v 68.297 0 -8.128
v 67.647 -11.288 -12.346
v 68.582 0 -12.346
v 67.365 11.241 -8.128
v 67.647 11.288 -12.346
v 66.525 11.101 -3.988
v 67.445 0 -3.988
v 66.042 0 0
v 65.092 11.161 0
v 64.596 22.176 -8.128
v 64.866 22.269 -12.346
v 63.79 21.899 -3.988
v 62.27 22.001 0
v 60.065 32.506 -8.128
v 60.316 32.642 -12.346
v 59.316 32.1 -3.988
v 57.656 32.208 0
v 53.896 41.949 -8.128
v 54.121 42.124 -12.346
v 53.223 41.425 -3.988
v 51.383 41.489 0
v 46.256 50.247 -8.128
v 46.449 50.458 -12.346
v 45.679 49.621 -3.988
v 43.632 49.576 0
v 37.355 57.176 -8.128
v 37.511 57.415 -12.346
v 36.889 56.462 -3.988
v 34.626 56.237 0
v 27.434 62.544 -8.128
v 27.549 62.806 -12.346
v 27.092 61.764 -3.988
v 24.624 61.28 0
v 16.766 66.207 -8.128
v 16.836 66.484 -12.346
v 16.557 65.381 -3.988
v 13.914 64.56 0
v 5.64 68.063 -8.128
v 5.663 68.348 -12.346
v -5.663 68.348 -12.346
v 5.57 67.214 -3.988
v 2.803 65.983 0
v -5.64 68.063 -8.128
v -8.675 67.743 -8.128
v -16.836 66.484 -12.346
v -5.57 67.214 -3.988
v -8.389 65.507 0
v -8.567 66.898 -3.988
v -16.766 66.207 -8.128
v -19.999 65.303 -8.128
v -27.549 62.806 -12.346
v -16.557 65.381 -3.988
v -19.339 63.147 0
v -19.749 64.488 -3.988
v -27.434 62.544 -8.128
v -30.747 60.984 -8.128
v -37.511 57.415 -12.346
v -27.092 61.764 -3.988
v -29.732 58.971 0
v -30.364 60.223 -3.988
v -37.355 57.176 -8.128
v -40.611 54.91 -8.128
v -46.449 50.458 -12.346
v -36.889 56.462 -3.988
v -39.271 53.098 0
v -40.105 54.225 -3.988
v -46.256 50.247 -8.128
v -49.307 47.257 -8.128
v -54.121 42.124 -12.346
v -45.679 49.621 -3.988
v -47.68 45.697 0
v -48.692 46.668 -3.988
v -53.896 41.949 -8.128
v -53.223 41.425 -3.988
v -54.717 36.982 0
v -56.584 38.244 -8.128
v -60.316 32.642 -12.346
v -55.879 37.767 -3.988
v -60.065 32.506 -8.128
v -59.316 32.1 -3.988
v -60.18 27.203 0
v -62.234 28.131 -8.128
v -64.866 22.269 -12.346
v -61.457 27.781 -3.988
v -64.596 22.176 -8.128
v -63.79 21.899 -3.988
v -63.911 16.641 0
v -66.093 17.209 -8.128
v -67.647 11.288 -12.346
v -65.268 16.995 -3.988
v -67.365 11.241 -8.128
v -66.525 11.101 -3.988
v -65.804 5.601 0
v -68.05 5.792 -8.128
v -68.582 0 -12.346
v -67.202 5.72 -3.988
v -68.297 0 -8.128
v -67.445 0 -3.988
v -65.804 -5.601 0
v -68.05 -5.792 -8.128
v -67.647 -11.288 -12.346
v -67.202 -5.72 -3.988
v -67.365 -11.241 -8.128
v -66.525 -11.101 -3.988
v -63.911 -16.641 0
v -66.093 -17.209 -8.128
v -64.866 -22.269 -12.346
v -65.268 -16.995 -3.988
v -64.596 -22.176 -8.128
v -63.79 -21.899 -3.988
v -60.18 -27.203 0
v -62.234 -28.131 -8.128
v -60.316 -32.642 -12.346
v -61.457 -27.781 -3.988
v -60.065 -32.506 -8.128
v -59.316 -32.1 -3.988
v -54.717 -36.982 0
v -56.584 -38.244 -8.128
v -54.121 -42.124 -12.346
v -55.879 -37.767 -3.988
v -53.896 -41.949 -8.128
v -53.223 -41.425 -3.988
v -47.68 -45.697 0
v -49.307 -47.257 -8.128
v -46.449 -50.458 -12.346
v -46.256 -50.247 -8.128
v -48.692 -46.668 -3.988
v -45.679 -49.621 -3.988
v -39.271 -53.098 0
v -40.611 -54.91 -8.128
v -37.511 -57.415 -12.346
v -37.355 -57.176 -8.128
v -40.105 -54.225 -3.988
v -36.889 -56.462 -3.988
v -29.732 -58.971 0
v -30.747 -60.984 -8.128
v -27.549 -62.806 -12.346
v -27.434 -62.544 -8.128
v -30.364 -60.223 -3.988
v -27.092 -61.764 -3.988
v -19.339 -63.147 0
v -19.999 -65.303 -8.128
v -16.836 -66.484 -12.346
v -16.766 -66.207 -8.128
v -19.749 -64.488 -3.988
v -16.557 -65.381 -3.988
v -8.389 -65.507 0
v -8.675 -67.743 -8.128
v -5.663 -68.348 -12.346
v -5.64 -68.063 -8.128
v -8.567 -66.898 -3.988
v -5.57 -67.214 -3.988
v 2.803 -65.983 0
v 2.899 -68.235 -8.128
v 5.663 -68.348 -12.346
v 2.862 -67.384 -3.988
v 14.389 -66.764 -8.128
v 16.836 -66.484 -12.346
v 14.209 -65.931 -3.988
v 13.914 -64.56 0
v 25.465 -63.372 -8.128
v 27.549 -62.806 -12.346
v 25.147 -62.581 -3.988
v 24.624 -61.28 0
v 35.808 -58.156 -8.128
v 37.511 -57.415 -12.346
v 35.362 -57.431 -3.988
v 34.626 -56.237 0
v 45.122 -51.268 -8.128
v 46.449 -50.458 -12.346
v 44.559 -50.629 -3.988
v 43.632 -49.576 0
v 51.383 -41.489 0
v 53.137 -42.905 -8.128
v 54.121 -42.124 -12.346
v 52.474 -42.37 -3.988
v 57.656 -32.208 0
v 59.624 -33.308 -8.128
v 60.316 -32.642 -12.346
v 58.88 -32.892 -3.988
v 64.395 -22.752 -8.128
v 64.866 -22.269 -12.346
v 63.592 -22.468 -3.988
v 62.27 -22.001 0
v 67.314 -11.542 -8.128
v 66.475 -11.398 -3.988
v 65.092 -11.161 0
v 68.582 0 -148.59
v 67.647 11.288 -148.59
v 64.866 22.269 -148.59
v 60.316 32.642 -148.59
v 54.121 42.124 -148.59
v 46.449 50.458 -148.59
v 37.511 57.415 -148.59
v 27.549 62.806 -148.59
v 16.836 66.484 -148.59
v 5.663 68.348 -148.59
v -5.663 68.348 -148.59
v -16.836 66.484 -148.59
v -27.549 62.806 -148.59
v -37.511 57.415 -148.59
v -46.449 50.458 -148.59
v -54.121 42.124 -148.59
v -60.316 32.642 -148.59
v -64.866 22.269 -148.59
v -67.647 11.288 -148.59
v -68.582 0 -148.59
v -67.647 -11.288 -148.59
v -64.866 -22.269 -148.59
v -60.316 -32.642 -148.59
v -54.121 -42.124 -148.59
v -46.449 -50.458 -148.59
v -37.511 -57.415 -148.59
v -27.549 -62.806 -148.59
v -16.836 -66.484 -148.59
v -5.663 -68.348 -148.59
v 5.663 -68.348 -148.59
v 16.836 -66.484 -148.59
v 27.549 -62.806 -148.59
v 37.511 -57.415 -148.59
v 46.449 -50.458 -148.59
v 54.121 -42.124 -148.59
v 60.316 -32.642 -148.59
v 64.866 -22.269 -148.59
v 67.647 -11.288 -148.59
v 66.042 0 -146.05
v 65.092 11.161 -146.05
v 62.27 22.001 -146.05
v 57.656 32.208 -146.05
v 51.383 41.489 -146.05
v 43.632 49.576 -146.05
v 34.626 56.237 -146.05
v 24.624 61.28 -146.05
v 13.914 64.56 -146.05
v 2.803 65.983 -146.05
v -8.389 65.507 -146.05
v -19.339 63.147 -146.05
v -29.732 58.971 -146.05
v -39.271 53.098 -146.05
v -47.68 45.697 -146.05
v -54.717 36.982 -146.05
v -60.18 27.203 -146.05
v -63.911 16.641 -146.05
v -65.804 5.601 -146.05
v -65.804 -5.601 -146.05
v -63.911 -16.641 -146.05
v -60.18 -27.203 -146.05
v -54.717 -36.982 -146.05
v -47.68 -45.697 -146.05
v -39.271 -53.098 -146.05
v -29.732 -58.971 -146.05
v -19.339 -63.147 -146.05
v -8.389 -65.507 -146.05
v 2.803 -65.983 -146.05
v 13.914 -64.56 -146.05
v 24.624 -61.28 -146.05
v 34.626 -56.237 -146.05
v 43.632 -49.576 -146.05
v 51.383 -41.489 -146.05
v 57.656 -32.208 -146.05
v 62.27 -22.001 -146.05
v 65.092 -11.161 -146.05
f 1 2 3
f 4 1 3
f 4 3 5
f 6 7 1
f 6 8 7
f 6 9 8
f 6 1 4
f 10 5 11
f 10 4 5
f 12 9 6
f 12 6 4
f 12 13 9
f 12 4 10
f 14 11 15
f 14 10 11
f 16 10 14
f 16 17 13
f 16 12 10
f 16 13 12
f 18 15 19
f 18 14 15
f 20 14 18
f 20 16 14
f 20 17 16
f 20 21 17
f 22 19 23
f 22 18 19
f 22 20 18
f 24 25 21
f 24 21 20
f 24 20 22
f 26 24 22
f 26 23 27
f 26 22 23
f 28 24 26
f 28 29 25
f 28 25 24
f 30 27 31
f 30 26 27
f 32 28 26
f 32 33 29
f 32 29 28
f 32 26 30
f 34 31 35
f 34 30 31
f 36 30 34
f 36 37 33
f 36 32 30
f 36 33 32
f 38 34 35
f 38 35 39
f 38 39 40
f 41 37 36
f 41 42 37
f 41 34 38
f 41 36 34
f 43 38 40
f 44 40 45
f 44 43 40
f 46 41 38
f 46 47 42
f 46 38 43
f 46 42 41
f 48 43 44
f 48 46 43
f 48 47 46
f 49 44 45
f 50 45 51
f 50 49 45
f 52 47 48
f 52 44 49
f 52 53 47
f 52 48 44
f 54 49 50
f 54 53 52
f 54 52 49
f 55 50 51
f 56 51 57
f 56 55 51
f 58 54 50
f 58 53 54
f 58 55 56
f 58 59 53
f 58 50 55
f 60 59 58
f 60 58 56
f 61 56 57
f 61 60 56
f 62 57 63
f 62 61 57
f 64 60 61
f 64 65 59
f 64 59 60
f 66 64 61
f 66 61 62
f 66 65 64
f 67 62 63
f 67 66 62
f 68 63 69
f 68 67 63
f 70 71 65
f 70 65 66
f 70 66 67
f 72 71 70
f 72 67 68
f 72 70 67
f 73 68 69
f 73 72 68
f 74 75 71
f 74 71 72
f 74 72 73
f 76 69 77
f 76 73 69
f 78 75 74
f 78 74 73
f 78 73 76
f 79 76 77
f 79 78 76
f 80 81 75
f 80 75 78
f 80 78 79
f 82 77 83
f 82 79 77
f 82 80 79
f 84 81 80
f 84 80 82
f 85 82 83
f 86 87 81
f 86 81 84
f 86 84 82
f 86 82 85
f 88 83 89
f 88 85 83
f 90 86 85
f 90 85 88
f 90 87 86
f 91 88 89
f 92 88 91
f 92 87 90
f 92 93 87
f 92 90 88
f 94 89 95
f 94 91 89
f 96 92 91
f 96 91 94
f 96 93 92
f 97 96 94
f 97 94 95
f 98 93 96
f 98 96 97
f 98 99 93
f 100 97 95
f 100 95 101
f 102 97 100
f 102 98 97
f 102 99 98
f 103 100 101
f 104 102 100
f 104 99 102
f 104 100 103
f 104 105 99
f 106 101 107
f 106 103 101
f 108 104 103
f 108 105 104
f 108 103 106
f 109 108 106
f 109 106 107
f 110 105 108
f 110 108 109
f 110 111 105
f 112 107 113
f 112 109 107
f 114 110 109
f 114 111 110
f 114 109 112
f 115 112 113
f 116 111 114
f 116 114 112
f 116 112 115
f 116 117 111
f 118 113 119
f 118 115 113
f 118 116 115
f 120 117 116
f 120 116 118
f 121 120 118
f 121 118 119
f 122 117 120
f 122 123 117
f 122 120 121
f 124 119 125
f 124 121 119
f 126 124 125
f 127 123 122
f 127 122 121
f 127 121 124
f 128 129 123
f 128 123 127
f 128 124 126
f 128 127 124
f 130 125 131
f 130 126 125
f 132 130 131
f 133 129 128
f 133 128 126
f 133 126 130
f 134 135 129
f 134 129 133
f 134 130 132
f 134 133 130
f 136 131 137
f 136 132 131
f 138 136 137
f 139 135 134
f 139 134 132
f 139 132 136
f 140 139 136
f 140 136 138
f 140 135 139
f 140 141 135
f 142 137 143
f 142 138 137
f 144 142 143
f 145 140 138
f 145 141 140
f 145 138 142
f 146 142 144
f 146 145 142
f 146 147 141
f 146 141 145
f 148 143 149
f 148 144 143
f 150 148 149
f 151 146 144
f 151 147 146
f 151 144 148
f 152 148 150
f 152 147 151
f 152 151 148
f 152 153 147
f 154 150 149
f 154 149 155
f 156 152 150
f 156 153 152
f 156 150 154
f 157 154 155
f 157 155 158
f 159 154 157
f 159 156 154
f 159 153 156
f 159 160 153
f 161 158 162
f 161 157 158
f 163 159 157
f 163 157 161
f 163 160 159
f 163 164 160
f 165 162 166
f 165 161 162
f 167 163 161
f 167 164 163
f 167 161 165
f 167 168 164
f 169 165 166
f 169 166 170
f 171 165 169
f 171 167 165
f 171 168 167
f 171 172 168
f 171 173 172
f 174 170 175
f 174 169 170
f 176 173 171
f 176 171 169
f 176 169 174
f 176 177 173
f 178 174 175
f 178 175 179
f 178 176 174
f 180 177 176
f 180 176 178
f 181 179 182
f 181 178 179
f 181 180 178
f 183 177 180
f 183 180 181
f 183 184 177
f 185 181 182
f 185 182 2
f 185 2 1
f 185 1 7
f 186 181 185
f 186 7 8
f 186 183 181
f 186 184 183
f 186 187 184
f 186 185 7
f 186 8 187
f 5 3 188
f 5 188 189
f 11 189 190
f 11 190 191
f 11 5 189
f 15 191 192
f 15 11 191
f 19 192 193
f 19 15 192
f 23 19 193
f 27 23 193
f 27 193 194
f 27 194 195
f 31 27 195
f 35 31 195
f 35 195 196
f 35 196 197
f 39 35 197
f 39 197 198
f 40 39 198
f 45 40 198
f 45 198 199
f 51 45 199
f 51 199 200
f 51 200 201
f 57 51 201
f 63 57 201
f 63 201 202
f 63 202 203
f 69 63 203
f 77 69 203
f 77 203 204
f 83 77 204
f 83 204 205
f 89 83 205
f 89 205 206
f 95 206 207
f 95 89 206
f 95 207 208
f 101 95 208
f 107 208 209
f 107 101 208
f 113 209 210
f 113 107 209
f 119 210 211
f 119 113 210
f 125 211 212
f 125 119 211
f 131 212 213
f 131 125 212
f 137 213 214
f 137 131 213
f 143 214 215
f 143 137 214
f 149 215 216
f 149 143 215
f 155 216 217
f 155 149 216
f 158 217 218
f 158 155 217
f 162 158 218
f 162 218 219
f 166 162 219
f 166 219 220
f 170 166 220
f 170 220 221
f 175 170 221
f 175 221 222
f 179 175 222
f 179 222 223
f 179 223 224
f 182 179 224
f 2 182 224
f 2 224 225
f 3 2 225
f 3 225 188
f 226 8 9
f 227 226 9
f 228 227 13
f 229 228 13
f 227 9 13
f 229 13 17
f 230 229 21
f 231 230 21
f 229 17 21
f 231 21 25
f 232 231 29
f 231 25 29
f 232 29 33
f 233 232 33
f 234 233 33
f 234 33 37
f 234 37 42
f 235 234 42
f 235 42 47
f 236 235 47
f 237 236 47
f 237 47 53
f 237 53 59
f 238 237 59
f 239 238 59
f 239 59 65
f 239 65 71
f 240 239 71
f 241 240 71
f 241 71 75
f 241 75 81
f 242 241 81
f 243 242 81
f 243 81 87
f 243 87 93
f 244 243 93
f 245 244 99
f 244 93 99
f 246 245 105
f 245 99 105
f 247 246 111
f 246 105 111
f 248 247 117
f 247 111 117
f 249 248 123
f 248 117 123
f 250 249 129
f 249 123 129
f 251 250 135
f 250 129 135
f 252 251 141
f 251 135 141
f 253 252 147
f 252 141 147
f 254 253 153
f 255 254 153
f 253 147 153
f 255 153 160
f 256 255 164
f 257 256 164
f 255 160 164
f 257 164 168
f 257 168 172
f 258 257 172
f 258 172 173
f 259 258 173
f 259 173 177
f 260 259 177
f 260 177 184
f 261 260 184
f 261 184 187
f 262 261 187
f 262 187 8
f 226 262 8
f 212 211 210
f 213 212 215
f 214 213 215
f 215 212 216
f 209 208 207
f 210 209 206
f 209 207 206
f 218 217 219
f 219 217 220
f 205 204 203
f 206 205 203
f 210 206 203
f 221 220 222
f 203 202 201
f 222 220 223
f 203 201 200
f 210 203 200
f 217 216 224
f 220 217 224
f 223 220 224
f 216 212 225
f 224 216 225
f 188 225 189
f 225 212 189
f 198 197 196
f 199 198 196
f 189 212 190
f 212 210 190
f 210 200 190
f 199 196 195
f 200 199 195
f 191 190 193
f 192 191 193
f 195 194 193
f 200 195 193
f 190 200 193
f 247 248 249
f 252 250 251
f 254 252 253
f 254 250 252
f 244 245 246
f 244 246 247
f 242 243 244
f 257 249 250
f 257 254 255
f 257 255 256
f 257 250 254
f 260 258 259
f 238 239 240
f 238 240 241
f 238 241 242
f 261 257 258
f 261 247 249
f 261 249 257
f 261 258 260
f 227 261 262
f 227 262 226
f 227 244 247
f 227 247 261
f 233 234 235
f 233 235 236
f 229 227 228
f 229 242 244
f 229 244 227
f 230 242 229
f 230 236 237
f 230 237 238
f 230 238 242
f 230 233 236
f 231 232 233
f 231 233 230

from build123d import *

# Parameters (mm, degrees)
F0_R     = 68.5822054127
F1_DEPTH = 148.59
F2_T     = -2.54


# Not quite as in the source:
# - a fillet or chamfer that OpenCascade refuses, or shapes differently, is made with other operations: its cross-section is extruded or revolved along the edge and cut away or added


with BuildPart() as f1:
    # F0 (on Top) → F1 (new body)
    with BuildSketch(Plane.XY):
        Circle(F0_R)
    extrude(amount=-F1_DEPTH)

    # F2
    f2_openings = [f1.faces().sort_by_distance(p)[0] for p in [
        (0, 0, 0),
    ]]
    offset(amount=F2_T, openings=f2_openings)

    # F3: fillet of radius 31.273722487 on 1 edges, made by hand

    # F3_s1 → F3_t2 (revolve, cut)
    with BuildSketch(Plane.XZ):
        with BuildLine():
            ThreePointArc((68.5822054127, -12.34580537), (67.9406243892, -6.0436130881), (66.0422054127, 0))
            Line((66.0422054127, 0), (66.6168798625, 0.2469161074))
            ThreePointArc((66.6168798625, 0.2469161074), (67.3122054127, 0.6254744497), (68.5822054127, 0.6254744497))
            Line((68.5822054127, 0.6254744497), (69.2076798625, 0))
            Line((69.2076798625, 0), (69.2076798625, -12.34580537))
            Line((69.2076798625, -12.34580537), (68.5822054127, -12.34580537))
        make_face()
    revolve(axis=Axis((0, 0, 0), (0, 0, 1)), mode=Mode.SUBTRACT)


solid = f1.part
